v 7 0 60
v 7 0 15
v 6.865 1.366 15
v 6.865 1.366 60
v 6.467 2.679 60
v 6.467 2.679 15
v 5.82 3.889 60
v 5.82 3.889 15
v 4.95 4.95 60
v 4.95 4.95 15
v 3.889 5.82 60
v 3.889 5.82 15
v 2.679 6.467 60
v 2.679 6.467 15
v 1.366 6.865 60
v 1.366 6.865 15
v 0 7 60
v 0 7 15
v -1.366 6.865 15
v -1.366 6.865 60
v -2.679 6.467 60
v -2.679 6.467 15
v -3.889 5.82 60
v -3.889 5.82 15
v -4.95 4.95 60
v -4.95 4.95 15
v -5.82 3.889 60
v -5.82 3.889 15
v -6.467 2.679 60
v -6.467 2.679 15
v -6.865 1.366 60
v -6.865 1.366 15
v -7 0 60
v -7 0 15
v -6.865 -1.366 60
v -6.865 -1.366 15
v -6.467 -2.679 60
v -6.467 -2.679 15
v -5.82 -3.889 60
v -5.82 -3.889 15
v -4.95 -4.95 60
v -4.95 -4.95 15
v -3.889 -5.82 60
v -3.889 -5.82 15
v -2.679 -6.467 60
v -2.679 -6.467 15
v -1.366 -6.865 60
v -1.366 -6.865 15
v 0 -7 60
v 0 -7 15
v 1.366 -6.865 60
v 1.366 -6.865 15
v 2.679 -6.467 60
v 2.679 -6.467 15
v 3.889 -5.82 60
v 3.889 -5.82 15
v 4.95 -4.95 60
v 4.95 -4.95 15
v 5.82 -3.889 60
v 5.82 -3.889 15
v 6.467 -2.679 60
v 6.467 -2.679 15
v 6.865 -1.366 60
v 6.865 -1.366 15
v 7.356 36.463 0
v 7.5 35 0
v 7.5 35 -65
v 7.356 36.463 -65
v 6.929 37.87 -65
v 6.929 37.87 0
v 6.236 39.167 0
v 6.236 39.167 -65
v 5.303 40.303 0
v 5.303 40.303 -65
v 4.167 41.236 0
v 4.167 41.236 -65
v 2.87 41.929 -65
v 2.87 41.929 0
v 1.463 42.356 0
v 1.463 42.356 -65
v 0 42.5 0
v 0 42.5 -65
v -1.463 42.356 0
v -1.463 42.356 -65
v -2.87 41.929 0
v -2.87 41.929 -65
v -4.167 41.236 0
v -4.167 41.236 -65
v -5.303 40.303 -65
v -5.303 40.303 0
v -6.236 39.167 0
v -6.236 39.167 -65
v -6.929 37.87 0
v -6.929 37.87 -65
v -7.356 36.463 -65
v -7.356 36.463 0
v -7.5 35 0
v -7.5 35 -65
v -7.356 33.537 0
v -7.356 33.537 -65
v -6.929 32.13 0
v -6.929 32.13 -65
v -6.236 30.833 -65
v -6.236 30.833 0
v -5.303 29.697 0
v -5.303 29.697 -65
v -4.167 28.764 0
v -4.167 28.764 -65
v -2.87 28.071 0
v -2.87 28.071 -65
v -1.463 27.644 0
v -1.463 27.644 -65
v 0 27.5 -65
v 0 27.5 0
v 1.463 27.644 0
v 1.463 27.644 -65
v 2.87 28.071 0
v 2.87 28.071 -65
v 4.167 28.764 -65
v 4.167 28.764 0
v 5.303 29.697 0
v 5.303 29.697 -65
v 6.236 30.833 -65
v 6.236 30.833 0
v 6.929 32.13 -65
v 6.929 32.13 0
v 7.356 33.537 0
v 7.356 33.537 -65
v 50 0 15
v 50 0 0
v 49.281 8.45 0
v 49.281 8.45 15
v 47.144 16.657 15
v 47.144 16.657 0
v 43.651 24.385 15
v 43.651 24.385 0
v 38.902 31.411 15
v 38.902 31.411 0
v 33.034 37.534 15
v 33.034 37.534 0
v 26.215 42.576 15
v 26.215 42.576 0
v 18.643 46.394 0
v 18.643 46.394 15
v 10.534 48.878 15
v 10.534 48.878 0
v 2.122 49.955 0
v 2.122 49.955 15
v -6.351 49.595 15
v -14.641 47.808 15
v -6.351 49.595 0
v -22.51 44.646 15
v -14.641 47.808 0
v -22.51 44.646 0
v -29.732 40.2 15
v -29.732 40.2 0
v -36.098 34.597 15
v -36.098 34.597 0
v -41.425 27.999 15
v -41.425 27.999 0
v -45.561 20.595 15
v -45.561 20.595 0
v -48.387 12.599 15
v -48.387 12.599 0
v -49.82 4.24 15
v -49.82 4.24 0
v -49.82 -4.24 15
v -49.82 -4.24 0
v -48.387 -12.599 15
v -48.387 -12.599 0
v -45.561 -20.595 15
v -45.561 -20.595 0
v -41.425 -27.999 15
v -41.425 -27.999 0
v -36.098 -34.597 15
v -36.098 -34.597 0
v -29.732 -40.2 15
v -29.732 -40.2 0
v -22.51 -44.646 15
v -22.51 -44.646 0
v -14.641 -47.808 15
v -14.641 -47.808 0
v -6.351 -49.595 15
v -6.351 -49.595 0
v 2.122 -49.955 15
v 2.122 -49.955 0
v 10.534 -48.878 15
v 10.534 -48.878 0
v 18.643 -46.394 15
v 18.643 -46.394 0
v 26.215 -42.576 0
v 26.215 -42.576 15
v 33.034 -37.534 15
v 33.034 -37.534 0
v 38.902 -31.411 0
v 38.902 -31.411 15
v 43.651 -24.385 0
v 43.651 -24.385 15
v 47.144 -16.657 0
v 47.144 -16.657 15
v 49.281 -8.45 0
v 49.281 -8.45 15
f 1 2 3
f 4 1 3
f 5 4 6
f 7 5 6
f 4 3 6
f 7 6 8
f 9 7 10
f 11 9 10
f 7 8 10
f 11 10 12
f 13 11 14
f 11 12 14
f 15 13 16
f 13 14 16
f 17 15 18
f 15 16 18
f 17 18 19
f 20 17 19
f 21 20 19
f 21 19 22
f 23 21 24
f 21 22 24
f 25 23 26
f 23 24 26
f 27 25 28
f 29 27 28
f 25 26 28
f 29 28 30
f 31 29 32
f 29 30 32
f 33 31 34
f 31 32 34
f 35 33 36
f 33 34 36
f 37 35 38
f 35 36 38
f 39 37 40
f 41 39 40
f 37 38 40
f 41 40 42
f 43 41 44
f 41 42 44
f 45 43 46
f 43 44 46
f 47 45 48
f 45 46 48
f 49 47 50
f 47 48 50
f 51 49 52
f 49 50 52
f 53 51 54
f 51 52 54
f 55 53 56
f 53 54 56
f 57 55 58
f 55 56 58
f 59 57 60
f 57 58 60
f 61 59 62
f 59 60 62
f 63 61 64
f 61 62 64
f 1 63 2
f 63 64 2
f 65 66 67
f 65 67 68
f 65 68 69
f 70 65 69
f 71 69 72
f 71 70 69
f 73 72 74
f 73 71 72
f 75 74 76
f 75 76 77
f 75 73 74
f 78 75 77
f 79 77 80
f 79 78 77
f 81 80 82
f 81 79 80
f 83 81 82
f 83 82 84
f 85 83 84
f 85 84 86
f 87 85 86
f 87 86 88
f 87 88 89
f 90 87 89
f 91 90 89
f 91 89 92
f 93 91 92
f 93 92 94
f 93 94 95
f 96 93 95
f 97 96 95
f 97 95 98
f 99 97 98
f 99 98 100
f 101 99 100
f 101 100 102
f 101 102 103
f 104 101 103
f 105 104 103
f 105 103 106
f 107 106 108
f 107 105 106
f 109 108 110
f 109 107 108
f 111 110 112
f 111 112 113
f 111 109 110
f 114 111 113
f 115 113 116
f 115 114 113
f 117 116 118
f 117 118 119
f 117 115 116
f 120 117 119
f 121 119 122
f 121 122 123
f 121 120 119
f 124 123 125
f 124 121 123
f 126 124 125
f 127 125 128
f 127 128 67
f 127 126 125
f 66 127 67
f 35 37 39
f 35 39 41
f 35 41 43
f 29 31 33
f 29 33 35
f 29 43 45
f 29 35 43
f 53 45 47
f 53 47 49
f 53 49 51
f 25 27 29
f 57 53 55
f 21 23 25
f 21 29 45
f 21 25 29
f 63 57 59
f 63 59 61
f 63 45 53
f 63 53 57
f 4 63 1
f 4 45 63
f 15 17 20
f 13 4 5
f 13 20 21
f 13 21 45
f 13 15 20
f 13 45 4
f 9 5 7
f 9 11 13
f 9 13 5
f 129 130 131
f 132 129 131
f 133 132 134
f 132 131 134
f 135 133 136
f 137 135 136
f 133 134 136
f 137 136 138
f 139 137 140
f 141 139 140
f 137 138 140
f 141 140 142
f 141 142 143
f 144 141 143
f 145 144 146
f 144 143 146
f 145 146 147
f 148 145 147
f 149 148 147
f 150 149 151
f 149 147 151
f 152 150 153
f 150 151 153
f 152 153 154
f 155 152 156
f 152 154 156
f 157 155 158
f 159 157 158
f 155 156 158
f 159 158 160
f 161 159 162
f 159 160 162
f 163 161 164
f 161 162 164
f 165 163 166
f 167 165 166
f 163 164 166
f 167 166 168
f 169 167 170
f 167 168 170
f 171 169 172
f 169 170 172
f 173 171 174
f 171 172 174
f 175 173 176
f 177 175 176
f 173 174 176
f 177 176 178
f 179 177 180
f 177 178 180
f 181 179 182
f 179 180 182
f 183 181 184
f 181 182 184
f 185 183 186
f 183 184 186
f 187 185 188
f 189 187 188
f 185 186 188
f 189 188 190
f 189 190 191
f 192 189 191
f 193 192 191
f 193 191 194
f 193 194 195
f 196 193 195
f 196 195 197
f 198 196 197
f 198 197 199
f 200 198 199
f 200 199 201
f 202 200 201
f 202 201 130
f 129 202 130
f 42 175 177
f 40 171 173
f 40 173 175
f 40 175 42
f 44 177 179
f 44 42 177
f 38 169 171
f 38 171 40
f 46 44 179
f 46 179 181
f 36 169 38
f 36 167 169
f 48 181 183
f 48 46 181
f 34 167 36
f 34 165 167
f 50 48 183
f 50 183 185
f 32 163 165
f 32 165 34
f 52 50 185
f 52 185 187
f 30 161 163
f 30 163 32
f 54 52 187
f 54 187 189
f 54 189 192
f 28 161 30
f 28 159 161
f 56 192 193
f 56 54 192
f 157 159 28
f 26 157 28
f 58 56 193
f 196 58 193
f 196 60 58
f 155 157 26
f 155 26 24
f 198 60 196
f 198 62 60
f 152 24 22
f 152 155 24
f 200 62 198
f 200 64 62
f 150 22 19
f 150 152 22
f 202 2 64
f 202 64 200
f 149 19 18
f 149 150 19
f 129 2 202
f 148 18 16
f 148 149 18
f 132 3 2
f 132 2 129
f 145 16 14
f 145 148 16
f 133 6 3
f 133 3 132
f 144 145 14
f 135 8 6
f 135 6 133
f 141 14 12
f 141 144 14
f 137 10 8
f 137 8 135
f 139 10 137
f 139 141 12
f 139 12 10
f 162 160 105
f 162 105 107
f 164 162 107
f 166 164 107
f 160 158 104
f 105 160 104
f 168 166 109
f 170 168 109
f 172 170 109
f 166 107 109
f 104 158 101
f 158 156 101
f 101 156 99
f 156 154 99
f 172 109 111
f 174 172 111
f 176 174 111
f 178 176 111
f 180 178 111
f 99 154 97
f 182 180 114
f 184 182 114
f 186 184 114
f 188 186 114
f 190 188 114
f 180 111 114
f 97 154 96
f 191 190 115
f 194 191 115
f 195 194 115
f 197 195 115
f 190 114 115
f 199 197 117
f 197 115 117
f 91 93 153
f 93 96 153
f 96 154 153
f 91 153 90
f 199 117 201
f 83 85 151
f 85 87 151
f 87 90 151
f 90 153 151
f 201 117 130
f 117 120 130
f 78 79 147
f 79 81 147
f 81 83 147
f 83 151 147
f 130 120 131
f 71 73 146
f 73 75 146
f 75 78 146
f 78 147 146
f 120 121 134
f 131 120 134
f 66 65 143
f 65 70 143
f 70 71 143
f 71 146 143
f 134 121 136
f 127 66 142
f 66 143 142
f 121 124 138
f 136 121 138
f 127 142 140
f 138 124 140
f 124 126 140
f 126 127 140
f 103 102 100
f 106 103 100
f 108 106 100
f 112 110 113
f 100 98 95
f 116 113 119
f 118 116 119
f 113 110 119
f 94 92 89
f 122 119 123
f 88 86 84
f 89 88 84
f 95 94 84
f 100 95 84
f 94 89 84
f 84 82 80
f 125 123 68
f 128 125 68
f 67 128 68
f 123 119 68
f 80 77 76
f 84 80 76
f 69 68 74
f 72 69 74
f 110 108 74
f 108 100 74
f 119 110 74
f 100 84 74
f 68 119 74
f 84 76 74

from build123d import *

# Parameters (mm, degrees)
SKETCH1_R           = 50
SKETCH1_R_2         = 7.5
BOSS_EXTRUDE1_DEPTH = 15
SKETCH2_R           = 7.5
BOSS_EXTRUDE2_DEPTH = 80
SKETCH5_R           = 7
BOSS_EXTRUDE3_DEPTH = 45


with BuildPart() as part:
    # Sketch1 → Boss-Extrude1 (new body)
    with BuildSketch(Plane.XY):
        Circle(SKETCH1_R)
        with Locations((0, 35)):
            Circle(SKETCH1_R_2, mode=Mode.SUBTRACT)
    extrude(amount=BOSS_EXTRUDE1_DEPTH)

    # Sketch2 → Boss-Extrude2 (add)
    with BuildSketch(Plane.XY.offset(15)):
        with Locations((0, 35)):
            Circle(SKETCH2_R)
    extrude(amount=-BOSS_EXTRUDE2_DEPTH)

    # Sketch5 → Boss-Extrude3 (add)
    with BuildSketch(Plane.XY.offset(15)):
        Circle(SKETCH5_R)
    extrude(amount=BOSS_EXTRUDE3_DEPTH)


solid = part.part
